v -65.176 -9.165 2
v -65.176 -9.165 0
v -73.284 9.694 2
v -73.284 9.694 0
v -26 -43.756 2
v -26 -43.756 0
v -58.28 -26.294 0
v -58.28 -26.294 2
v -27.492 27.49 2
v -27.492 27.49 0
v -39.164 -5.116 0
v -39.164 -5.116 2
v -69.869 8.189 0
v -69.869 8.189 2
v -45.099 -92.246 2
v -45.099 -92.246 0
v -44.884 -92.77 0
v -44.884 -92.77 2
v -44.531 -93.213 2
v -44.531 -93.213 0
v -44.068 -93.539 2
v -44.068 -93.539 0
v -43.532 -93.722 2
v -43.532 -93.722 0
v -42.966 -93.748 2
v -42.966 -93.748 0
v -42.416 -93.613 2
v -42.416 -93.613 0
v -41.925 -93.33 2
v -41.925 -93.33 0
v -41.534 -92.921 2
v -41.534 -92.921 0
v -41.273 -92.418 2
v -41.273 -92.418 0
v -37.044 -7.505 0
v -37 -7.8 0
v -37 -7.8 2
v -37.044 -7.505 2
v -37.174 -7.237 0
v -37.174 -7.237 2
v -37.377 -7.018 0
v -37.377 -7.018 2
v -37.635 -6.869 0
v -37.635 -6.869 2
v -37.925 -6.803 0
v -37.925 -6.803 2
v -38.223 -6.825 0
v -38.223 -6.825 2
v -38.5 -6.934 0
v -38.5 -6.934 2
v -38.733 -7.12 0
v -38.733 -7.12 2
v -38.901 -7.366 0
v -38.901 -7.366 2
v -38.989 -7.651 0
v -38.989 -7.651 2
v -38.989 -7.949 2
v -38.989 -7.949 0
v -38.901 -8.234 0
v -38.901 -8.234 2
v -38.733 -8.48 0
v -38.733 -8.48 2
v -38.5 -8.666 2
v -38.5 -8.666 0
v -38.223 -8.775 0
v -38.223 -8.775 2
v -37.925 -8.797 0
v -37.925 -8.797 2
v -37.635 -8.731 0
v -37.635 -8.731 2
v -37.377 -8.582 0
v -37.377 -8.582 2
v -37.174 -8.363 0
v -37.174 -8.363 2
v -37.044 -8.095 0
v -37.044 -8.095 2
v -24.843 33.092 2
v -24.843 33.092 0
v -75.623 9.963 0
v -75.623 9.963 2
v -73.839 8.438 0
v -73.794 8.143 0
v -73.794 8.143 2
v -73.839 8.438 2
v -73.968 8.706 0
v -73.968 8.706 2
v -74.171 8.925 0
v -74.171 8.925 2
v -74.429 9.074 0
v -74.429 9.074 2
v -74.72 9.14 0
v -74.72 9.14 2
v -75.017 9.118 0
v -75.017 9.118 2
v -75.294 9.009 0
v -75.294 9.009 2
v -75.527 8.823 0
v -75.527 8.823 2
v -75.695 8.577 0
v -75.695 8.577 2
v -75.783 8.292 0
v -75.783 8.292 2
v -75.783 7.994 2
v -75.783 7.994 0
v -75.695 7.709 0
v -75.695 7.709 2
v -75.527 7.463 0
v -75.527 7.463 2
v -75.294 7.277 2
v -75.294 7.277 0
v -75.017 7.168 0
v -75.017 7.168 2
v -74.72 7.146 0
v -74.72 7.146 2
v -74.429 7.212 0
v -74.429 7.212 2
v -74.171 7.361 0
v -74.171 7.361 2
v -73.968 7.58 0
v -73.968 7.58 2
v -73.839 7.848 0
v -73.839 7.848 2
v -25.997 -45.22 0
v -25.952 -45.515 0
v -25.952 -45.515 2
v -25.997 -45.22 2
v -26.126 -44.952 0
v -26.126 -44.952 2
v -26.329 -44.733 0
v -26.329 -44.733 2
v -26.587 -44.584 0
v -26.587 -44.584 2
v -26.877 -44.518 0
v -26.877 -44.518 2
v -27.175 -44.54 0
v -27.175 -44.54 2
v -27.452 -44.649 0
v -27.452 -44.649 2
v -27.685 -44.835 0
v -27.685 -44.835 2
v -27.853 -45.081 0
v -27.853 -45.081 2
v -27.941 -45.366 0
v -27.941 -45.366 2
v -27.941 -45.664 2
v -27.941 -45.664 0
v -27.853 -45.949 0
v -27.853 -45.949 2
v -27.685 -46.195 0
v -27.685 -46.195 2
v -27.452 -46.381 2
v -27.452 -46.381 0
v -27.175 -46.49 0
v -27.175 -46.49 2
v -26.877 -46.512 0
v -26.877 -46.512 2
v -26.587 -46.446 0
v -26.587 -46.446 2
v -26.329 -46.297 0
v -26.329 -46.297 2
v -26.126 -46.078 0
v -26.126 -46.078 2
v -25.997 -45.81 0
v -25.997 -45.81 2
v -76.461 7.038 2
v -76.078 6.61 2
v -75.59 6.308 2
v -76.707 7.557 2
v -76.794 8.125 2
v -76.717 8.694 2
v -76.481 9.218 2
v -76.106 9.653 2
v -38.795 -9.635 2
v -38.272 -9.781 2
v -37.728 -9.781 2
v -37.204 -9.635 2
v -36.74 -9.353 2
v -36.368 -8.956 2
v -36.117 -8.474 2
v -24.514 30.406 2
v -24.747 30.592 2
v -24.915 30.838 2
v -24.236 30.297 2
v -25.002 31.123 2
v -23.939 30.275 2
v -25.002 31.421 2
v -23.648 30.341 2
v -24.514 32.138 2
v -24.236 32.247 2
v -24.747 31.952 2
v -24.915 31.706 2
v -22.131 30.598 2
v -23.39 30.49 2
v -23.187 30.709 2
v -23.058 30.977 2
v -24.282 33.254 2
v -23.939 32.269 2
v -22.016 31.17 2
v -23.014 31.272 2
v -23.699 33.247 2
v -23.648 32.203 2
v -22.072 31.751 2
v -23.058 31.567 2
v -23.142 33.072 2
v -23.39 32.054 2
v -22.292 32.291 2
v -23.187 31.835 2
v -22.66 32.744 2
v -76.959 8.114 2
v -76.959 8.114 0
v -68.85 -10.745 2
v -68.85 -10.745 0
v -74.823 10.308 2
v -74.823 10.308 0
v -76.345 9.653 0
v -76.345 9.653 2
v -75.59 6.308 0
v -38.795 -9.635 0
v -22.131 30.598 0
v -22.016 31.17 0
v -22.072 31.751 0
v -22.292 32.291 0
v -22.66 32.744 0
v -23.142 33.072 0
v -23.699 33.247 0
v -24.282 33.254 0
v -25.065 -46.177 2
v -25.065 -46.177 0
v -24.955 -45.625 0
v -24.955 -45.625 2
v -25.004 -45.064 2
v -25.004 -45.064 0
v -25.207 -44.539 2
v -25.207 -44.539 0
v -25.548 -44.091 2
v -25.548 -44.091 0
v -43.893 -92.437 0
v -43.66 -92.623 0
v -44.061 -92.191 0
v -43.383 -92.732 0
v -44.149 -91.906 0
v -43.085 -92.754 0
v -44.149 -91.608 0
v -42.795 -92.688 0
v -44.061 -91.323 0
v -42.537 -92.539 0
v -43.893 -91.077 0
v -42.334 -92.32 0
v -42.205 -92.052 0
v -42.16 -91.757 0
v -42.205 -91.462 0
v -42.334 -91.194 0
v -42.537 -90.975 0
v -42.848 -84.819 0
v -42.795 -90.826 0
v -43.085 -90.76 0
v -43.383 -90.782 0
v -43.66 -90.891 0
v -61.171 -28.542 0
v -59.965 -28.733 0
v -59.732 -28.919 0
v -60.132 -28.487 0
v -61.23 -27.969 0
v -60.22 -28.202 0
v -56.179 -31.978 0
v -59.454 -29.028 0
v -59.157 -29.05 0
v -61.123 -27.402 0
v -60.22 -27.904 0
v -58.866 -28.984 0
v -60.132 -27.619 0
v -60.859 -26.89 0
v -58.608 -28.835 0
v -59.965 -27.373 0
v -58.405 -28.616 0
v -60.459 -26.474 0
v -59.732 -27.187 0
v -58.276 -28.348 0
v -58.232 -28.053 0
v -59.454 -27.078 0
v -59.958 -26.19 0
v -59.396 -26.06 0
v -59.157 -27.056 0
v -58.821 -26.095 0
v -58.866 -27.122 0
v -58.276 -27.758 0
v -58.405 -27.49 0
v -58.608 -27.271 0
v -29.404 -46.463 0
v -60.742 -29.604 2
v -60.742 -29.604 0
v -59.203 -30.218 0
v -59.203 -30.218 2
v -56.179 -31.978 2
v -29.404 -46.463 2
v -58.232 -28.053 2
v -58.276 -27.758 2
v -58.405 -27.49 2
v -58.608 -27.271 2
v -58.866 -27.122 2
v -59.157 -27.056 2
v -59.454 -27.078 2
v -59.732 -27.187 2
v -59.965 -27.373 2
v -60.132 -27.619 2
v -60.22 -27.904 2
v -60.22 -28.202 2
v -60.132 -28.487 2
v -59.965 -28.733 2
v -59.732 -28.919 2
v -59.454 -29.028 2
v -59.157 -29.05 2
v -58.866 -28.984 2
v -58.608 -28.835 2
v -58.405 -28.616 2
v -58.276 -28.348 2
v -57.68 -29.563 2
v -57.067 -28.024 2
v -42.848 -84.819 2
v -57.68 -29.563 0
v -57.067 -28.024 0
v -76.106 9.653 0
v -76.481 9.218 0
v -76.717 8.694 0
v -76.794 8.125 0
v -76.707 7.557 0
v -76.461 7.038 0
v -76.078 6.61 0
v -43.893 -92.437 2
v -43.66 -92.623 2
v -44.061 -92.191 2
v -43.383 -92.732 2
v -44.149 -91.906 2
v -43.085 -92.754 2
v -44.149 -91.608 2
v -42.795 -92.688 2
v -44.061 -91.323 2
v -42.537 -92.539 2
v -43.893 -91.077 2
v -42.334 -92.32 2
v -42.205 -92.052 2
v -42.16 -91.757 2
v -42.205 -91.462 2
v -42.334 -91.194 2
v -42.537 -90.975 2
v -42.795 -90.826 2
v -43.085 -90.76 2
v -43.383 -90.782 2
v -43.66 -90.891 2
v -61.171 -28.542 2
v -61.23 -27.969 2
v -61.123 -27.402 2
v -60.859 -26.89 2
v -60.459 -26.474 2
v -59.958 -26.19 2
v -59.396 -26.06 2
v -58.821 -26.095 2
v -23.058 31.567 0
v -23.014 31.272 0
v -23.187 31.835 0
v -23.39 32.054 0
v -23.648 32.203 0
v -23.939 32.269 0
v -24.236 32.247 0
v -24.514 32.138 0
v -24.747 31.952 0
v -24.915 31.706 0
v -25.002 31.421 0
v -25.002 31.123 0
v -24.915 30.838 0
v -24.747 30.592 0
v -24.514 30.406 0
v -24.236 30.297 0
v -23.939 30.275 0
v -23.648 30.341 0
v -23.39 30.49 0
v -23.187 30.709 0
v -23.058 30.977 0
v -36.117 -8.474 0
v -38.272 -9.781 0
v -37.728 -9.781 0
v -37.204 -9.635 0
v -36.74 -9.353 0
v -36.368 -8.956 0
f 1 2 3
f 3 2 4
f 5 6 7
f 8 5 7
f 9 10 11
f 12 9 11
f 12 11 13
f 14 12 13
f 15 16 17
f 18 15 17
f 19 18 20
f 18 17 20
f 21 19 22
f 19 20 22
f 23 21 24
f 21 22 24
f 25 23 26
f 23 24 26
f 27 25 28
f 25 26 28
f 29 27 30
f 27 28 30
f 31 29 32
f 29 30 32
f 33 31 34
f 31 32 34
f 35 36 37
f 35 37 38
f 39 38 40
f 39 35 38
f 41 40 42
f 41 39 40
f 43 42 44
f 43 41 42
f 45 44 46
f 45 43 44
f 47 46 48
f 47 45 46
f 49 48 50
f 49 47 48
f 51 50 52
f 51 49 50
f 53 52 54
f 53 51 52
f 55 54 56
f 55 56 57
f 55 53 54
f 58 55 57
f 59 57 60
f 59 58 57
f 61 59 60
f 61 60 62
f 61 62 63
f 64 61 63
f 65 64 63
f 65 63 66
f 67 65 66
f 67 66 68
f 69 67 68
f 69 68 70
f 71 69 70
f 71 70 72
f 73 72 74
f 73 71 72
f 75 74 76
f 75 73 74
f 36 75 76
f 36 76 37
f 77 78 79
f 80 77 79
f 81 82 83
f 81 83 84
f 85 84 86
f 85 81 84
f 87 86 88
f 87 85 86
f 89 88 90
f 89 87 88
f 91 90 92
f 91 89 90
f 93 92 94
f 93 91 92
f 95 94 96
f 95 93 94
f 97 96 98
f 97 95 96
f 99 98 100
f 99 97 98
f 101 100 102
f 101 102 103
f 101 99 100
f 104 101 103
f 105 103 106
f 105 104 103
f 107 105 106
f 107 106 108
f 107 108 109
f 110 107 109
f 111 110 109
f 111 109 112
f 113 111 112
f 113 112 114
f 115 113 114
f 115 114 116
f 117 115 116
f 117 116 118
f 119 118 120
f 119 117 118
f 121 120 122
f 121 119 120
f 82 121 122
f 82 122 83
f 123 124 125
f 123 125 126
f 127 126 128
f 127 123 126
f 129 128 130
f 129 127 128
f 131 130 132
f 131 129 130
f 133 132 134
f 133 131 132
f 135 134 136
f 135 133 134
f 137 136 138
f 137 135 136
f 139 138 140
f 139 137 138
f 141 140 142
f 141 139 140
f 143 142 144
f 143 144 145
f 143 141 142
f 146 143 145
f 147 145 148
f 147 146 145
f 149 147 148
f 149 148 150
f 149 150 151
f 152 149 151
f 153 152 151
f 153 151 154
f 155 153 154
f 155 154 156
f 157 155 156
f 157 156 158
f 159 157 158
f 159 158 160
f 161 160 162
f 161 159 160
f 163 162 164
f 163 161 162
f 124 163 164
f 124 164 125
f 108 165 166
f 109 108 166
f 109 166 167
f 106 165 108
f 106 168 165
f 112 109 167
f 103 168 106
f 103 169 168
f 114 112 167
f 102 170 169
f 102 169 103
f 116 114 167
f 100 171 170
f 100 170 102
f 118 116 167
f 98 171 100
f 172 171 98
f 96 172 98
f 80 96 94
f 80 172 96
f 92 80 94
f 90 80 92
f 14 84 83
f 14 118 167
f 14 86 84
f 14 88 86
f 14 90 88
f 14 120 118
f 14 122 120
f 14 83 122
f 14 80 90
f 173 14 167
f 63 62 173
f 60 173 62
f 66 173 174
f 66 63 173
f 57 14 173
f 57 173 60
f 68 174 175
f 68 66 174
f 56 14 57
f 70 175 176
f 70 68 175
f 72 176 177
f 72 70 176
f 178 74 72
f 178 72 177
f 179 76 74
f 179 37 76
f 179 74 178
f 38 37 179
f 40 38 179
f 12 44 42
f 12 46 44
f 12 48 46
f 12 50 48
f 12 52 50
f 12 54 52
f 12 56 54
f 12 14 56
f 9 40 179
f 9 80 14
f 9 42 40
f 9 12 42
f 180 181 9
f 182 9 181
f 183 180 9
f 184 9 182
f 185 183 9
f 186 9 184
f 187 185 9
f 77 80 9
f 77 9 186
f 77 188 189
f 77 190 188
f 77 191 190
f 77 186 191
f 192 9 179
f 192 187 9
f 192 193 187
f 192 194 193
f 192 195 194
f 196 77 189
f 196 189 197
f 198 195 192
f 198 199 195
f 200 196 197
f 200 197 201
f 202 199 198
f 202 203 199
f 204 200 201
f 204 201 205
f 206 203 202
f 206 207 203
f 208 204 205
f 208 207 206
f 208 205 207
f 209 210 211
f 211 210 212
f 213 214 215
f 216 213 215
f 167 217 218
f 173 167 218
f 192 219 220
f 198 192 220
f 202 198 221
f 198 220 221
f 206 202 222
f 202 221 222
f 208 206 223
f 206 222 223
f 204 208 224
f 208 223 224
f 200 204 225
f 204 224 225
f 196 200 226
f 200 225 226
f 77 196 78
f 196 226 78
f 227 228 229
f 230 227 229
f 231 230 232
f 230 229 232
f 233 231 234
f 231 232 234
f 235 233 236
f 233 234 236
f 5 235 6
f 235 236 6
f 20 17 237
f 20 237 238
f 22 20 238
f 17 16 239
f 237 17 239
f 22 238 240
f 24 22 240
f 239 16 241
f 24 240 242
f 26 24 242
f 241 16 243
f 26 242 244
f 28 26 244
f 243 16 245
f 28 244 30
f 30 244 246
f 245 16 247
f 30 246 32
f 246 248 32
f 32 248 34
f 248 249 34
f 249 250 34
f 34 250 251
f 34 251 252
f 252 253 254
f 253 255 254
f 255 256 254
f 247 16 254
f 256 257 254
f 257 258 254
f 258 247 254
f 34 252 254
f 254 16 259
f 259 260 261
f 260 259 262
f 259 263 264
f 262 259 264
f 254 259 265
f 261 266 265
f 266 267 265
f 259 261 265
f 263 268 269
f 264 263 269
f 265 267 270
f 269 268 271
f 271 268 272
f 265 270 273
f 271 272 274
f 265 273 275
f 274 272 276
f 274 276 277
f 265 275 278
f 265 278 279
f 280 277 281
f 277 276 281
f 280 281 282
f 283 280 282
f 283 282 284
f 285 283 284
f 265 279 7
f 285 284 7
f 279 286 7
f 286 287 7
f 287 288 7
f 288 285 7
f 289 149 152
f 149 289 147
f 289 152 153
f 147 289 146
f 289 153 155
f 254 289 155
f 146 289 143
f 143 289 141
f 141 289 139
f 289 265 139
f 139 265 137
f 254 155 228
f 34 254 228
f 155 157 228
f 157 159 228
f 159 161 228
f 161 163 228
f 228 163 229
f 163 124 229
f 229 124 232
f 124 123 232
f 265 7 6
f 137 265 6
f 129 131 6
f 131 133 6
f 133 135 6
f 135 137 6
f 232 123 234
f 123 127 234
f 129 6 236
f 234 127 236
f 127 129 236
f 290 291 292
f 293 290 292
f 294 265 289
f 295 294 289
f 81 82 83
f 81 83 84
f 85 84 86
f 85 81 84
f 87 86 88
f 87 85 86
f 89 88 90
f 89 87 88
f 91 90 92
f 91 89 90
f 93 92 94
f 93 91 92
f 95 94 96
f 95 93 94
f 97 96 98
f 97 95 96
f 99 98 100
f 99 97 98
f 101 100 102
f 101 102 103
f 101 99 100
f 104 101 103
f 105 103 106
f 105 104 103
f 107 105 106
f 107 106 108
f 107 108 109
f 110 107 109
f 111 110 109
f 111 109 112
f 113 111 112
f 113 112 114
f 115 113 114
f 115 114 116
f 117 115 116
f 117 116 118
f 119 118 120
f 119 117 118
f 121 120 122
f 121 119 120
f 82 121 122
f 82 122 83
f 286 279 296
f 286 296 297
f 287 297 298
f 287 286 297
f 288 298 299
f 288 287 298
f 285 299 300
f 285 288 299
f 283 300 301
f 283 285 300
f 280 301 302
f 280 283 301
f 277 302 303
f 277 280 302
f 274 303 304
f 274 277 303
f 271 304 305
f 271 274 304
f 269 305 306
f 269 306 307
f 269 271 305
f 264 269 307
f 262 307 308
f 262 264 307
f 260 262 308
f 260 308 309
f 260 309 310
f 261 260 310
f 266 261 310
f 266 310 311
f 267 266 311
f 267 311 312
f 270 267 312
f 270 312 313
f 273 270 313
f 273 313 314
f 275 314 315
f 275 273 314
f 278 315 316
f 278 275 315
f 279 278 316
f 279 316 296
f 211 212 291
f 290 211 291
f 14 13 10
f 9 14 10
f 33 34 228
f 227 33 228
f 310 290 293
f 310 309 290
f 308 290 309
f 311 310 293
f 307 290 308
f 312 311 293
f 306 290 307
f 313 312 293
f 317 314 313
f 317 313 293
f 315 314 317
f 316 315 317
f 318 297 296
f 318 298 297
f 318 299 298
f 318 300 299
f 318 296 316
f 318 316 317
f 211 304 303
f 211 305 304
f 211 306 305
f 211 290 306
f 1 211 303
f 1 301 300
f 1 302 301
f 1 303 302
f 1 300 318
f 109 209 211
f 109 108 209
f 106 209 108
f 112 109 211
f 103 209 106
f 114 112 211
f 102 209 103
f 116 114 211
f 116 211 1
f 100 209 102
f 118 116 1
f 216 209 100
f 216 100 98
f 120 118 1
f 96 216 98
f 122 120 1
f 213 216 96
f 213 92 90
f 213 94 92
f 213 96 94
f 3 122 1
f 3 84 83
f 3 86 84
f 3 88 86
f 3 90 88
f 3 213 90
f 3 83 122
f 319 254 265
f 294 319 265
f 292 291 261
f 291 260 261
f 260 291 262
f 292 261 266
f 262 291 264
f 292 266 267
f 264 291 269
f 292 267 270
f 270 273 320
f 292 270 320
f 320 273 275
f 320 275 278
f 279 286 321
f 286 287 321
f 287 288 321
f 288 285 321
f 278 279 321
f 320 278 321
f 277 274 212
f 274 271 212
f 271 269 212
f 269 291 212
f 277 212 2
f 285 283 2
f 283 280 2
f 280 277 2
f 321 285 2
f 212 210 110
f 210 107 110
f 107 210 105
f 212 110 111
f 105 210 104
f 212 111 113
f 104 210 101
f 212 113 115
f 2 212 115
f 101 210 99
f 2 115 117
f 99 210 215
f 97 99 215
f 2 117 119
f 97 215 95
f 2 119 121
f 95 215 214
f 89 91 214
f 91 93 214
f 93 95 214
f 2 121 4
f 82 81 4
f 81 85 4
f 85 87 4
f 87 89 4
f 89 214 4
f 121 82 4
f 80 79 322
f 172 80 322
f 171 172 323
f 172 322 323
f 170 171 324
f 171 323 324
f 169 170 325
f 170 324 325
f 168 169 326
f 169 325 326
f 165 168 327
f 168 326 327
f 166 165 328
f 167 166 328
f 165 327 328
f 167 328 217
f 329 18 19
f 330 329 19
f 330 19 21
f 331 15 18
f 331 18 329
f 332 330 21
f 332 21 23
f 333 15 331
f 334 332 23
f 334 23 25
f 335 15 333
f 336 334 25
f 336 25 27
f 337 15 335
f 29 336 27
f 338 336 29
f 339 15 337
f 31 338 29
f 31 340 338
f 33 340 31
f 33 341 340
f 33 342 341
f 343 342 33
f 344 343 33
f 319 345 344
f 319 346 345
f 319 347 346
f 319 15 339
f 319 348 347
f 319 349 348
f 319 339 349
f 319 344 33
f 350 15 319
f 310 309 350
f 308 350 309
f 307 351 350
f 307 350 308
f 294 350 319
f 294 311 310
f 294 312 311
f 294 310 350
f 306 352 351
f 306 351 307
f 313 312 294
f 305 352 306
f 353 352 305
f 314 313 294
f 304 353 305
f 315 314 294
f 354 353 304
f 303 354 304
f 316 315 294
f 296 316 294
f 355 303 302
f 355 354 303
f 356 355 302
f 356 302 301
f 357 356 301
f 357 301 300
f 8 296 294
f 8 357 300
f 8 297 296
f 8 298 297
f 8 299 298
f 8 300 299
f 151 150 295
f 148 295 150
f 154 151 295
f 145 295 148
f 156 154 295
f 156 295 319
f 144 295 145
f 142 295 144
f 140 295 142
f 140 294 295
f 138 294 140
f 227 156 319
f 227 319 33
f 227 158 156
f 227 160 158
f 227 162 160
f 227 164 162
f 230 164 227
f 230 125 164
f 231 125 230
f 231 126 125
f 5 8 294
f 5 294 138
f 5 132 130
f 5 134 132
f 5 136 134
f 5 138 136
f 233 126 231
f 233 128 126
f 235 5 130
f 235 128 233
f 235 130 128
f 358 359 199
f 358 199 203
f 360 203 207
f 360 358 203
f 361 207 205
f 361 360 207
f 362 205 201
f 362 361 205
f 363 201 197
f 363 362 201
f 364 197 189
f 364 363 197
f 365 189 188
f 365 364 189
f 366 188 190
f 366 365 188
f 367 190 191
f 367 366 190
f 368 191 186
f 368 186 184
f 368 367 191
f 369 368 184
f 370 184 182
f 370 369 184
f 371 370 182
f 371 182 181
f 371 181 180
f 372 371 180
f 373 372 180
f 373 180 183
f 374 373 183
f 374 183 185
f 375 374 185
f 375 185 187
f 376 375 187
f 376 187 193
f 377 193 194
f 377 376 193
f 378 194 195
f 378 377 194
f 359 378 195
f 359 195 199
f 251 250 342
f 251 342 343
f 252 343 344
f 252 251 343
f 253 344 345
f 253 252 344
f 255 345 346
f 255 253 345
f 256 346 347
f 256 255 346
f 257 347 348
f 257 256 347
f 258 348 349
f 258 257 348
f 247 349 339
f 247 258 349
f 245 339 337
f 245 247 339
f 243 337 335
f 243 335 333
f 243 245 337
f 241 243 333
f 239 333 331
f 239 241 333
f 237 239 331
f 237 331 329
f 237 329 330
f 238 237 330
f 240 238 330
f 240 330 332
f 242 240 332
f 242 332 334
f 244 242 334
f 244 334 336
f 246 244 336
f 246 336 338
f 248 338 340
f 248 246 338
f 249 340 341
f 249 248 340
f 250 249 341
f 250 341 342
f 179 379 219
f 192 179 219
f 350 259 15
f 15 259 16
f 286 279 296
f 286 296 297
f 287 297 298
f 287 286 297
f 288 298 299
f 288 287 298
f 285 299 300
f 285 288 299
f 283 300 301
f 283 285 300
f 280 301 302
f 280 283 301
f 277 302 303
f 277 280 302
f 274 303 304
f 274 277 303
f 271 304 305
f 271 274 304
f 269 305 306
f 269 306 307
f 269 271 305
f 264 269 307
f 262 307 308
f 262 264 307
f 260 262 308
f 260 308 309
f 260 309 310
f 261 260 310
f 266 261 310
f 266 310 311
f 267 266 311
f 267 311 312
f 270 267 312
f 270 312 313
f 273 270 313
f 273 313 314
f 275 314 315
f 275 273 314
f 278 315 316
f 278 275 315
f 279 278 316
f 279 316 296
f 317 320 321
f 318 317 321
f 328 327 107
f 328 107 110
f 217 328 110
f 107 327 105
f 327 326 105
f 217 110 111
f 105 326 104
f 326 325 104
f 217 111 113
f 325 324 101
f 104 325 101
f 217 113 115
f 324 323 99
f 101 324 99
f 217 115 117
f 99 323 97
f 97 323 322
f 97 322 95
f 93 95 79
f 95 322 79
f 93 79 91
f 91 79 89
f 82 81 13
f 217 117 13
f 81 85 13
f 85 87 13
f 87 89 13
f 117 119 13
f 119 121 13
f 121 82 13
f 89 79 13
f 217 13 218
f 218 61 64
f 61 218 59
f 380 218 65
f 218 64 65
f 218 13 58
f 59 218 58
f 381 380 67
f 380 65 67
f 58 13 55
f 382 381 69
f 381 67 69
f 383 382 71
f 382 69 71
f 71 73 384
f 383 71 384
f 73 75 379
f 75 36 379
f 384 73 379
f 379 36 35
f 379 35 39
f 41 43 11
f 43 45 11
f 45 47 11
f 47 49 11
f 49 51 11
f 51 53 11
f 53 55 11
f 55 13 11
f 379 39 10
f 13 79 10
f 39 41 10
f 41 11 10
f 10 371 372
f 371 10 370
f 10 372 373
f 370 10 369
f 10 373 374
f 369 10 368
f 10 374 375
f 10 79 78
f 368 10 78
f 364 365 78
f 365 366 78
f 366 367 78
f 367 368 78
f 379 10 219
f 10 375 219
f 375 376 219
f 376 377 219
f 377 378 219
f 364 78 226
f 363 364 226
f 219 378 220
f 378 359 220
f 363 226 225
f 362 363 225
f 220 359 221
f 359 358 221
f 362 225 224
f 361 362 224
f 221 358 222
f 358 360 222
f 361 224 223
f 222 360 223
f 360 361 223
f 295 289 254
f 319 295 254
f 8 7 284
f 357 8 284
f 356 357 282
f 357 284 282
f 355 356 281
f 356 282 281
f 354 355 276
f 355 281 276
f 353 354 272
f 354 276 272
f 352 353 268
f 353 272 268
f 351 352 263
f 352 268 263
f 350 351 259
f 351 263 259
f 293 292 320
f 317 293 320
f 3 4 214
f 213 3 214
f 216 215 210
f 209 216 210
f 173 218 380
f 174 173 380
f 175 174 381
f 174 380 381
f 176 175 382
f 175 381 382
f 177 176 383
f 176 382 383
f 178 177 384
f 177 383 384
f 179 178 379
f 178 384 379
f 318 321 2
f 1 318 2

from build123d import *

# Parameters (mm, degrees)
F2_R     = 1
F3_DEPTH = 2
F4_R     = 1
F5_DEPTH = 2
F6_R     = 1
F7_DEPTH = 2


with BuildPart() as f3:
    # F2 (on Top) → F3 (new body)
    with BuildSketch(Plane.XY):
        with BuildLine():
            Line((-24.8425289053, 33.0921988987), (-75.6233591891, 9.9632716498))
            ThreePointArc((-75.6233591891, 9.9632716498), (-76.7942797615, 8.124664252), (-75.5895359648, 6.308039763))
            Line((-75.5895359648, 6.308039763), (-38.7951705838, -9.6351304429))
            ThreePointArc((-38.7951705838, -9.6351304429), (-37.204469868, -9.6349746072), (-36.1170073516, -8.4740465013))
            Line((-36.1170073516, -8.4740465013), (-22.1305424487, 30.5980509535))
            ThreePointArc((-22.1305424487, 30.5980509535), (-22.6596806434, 32.7441973557), (-24.8425289053, 33.0921988987))
        make_face()
        with Locations((-74.7943653809, 8.1431702059)):
            Circle(F2_R, mode=Mode.SUBTRACT)
        with Locations((-38, -7.8)):
            Circle(F2_R, mode=Mode.SUBTRACT)
        Polygon((-39.1635509363, -5.1161463828), (-69.8691773282, 8.1887448085), (-27.4915690607, 27.490292521), align=None, mode=Mode.SUBTRACT)
        with Locations((-24.0135350971, 31.2720974548)):
            Circle(F2_R, mode=Mode.SUBTRACT)
    extrude(amount=F3_DEPTH)


with BuildPart() as f5:
    # F4 (on Top) → F5 (new body)
    with BuildSketch(Plane.XY):
        with BuildLine():
            Line((-26.0004863264, -43.7560743701), (-58.2798942563, -26.2938344308))
            ThreePointArc((-58.2798942563, -26.2938344308), (-60.459357187, -26.4741954623), (-61.1707540085, -28.5421662867))
            Line((-61.1707540085, -28.5421662867), (-45.0993495711, -92.2461689821))
            ThreePointArc((-45.0993495711, -92.2461689821), (-43.2500797202, -93.7549082873), (-41.2726916361, -92.4184840891))
            Line((-41.2726916361, -92.4184840891), (-25.0646881436, -46.176721333))
            ThreePointArc((-25.0646881436, -46.176721333), (-25.0866528288, -44.7940040191), (-26.0004863264, -43.7560743701))
        make_face()
        with Locations((-43.1601105241, -91.7569329261)):
            Circle(F4_R, mode=Mode.SUBTRACT)
        with Locations((-59.2315149614, -28.0529302307)):
            Circle(F4_R, mode=Mode.SUBTRACT)
        Polygon((-42.847704835, -84.8192376194), (-56.1785207693, -31.978408585), (-29.4035835035, -46.4628867363), align=None, mode=Mode.SUBTRACT)
        with Locations((-26.9521070316, -45.5151701701)):
            Circle(F4_R, mode=Mode.SUBTRACT)
    extrude(amount=F5_DEPTH)


with BuildPart() as f7:
    # F6 (on Top) → F7 (new body)
    with BuildSketch(Plane.XY):
        Polygon((-76.345419499, 9.6533101411), (-76.9589564545, 8.1142395098), (-68.8503056756, -10.7448724195), (-60.7416548966, -29.6039843488), (-59.2025842653, -30.2175213043), (-57.6804608434, -29.563070166), (-57.0669238878, -28.0239995346), (-65.1755746668, -9.1648876053), (-73.2842254457, 9.6942243239), (-74.8232960771, 10.3077612795), align=None)
        with Locations((-59.2315149614, -28.0529302307)):
            Circle(F6_R, mode=Mode.SUBTRACT)
        with Locations((-74.7943653809, 8.1431702059)):
            Circle(F6_R, mode=Mode.SUBTRACT)
    extrude(amount=F7_DEPTH)


solid = Compound([f3.part, f5.part, f7.part])
